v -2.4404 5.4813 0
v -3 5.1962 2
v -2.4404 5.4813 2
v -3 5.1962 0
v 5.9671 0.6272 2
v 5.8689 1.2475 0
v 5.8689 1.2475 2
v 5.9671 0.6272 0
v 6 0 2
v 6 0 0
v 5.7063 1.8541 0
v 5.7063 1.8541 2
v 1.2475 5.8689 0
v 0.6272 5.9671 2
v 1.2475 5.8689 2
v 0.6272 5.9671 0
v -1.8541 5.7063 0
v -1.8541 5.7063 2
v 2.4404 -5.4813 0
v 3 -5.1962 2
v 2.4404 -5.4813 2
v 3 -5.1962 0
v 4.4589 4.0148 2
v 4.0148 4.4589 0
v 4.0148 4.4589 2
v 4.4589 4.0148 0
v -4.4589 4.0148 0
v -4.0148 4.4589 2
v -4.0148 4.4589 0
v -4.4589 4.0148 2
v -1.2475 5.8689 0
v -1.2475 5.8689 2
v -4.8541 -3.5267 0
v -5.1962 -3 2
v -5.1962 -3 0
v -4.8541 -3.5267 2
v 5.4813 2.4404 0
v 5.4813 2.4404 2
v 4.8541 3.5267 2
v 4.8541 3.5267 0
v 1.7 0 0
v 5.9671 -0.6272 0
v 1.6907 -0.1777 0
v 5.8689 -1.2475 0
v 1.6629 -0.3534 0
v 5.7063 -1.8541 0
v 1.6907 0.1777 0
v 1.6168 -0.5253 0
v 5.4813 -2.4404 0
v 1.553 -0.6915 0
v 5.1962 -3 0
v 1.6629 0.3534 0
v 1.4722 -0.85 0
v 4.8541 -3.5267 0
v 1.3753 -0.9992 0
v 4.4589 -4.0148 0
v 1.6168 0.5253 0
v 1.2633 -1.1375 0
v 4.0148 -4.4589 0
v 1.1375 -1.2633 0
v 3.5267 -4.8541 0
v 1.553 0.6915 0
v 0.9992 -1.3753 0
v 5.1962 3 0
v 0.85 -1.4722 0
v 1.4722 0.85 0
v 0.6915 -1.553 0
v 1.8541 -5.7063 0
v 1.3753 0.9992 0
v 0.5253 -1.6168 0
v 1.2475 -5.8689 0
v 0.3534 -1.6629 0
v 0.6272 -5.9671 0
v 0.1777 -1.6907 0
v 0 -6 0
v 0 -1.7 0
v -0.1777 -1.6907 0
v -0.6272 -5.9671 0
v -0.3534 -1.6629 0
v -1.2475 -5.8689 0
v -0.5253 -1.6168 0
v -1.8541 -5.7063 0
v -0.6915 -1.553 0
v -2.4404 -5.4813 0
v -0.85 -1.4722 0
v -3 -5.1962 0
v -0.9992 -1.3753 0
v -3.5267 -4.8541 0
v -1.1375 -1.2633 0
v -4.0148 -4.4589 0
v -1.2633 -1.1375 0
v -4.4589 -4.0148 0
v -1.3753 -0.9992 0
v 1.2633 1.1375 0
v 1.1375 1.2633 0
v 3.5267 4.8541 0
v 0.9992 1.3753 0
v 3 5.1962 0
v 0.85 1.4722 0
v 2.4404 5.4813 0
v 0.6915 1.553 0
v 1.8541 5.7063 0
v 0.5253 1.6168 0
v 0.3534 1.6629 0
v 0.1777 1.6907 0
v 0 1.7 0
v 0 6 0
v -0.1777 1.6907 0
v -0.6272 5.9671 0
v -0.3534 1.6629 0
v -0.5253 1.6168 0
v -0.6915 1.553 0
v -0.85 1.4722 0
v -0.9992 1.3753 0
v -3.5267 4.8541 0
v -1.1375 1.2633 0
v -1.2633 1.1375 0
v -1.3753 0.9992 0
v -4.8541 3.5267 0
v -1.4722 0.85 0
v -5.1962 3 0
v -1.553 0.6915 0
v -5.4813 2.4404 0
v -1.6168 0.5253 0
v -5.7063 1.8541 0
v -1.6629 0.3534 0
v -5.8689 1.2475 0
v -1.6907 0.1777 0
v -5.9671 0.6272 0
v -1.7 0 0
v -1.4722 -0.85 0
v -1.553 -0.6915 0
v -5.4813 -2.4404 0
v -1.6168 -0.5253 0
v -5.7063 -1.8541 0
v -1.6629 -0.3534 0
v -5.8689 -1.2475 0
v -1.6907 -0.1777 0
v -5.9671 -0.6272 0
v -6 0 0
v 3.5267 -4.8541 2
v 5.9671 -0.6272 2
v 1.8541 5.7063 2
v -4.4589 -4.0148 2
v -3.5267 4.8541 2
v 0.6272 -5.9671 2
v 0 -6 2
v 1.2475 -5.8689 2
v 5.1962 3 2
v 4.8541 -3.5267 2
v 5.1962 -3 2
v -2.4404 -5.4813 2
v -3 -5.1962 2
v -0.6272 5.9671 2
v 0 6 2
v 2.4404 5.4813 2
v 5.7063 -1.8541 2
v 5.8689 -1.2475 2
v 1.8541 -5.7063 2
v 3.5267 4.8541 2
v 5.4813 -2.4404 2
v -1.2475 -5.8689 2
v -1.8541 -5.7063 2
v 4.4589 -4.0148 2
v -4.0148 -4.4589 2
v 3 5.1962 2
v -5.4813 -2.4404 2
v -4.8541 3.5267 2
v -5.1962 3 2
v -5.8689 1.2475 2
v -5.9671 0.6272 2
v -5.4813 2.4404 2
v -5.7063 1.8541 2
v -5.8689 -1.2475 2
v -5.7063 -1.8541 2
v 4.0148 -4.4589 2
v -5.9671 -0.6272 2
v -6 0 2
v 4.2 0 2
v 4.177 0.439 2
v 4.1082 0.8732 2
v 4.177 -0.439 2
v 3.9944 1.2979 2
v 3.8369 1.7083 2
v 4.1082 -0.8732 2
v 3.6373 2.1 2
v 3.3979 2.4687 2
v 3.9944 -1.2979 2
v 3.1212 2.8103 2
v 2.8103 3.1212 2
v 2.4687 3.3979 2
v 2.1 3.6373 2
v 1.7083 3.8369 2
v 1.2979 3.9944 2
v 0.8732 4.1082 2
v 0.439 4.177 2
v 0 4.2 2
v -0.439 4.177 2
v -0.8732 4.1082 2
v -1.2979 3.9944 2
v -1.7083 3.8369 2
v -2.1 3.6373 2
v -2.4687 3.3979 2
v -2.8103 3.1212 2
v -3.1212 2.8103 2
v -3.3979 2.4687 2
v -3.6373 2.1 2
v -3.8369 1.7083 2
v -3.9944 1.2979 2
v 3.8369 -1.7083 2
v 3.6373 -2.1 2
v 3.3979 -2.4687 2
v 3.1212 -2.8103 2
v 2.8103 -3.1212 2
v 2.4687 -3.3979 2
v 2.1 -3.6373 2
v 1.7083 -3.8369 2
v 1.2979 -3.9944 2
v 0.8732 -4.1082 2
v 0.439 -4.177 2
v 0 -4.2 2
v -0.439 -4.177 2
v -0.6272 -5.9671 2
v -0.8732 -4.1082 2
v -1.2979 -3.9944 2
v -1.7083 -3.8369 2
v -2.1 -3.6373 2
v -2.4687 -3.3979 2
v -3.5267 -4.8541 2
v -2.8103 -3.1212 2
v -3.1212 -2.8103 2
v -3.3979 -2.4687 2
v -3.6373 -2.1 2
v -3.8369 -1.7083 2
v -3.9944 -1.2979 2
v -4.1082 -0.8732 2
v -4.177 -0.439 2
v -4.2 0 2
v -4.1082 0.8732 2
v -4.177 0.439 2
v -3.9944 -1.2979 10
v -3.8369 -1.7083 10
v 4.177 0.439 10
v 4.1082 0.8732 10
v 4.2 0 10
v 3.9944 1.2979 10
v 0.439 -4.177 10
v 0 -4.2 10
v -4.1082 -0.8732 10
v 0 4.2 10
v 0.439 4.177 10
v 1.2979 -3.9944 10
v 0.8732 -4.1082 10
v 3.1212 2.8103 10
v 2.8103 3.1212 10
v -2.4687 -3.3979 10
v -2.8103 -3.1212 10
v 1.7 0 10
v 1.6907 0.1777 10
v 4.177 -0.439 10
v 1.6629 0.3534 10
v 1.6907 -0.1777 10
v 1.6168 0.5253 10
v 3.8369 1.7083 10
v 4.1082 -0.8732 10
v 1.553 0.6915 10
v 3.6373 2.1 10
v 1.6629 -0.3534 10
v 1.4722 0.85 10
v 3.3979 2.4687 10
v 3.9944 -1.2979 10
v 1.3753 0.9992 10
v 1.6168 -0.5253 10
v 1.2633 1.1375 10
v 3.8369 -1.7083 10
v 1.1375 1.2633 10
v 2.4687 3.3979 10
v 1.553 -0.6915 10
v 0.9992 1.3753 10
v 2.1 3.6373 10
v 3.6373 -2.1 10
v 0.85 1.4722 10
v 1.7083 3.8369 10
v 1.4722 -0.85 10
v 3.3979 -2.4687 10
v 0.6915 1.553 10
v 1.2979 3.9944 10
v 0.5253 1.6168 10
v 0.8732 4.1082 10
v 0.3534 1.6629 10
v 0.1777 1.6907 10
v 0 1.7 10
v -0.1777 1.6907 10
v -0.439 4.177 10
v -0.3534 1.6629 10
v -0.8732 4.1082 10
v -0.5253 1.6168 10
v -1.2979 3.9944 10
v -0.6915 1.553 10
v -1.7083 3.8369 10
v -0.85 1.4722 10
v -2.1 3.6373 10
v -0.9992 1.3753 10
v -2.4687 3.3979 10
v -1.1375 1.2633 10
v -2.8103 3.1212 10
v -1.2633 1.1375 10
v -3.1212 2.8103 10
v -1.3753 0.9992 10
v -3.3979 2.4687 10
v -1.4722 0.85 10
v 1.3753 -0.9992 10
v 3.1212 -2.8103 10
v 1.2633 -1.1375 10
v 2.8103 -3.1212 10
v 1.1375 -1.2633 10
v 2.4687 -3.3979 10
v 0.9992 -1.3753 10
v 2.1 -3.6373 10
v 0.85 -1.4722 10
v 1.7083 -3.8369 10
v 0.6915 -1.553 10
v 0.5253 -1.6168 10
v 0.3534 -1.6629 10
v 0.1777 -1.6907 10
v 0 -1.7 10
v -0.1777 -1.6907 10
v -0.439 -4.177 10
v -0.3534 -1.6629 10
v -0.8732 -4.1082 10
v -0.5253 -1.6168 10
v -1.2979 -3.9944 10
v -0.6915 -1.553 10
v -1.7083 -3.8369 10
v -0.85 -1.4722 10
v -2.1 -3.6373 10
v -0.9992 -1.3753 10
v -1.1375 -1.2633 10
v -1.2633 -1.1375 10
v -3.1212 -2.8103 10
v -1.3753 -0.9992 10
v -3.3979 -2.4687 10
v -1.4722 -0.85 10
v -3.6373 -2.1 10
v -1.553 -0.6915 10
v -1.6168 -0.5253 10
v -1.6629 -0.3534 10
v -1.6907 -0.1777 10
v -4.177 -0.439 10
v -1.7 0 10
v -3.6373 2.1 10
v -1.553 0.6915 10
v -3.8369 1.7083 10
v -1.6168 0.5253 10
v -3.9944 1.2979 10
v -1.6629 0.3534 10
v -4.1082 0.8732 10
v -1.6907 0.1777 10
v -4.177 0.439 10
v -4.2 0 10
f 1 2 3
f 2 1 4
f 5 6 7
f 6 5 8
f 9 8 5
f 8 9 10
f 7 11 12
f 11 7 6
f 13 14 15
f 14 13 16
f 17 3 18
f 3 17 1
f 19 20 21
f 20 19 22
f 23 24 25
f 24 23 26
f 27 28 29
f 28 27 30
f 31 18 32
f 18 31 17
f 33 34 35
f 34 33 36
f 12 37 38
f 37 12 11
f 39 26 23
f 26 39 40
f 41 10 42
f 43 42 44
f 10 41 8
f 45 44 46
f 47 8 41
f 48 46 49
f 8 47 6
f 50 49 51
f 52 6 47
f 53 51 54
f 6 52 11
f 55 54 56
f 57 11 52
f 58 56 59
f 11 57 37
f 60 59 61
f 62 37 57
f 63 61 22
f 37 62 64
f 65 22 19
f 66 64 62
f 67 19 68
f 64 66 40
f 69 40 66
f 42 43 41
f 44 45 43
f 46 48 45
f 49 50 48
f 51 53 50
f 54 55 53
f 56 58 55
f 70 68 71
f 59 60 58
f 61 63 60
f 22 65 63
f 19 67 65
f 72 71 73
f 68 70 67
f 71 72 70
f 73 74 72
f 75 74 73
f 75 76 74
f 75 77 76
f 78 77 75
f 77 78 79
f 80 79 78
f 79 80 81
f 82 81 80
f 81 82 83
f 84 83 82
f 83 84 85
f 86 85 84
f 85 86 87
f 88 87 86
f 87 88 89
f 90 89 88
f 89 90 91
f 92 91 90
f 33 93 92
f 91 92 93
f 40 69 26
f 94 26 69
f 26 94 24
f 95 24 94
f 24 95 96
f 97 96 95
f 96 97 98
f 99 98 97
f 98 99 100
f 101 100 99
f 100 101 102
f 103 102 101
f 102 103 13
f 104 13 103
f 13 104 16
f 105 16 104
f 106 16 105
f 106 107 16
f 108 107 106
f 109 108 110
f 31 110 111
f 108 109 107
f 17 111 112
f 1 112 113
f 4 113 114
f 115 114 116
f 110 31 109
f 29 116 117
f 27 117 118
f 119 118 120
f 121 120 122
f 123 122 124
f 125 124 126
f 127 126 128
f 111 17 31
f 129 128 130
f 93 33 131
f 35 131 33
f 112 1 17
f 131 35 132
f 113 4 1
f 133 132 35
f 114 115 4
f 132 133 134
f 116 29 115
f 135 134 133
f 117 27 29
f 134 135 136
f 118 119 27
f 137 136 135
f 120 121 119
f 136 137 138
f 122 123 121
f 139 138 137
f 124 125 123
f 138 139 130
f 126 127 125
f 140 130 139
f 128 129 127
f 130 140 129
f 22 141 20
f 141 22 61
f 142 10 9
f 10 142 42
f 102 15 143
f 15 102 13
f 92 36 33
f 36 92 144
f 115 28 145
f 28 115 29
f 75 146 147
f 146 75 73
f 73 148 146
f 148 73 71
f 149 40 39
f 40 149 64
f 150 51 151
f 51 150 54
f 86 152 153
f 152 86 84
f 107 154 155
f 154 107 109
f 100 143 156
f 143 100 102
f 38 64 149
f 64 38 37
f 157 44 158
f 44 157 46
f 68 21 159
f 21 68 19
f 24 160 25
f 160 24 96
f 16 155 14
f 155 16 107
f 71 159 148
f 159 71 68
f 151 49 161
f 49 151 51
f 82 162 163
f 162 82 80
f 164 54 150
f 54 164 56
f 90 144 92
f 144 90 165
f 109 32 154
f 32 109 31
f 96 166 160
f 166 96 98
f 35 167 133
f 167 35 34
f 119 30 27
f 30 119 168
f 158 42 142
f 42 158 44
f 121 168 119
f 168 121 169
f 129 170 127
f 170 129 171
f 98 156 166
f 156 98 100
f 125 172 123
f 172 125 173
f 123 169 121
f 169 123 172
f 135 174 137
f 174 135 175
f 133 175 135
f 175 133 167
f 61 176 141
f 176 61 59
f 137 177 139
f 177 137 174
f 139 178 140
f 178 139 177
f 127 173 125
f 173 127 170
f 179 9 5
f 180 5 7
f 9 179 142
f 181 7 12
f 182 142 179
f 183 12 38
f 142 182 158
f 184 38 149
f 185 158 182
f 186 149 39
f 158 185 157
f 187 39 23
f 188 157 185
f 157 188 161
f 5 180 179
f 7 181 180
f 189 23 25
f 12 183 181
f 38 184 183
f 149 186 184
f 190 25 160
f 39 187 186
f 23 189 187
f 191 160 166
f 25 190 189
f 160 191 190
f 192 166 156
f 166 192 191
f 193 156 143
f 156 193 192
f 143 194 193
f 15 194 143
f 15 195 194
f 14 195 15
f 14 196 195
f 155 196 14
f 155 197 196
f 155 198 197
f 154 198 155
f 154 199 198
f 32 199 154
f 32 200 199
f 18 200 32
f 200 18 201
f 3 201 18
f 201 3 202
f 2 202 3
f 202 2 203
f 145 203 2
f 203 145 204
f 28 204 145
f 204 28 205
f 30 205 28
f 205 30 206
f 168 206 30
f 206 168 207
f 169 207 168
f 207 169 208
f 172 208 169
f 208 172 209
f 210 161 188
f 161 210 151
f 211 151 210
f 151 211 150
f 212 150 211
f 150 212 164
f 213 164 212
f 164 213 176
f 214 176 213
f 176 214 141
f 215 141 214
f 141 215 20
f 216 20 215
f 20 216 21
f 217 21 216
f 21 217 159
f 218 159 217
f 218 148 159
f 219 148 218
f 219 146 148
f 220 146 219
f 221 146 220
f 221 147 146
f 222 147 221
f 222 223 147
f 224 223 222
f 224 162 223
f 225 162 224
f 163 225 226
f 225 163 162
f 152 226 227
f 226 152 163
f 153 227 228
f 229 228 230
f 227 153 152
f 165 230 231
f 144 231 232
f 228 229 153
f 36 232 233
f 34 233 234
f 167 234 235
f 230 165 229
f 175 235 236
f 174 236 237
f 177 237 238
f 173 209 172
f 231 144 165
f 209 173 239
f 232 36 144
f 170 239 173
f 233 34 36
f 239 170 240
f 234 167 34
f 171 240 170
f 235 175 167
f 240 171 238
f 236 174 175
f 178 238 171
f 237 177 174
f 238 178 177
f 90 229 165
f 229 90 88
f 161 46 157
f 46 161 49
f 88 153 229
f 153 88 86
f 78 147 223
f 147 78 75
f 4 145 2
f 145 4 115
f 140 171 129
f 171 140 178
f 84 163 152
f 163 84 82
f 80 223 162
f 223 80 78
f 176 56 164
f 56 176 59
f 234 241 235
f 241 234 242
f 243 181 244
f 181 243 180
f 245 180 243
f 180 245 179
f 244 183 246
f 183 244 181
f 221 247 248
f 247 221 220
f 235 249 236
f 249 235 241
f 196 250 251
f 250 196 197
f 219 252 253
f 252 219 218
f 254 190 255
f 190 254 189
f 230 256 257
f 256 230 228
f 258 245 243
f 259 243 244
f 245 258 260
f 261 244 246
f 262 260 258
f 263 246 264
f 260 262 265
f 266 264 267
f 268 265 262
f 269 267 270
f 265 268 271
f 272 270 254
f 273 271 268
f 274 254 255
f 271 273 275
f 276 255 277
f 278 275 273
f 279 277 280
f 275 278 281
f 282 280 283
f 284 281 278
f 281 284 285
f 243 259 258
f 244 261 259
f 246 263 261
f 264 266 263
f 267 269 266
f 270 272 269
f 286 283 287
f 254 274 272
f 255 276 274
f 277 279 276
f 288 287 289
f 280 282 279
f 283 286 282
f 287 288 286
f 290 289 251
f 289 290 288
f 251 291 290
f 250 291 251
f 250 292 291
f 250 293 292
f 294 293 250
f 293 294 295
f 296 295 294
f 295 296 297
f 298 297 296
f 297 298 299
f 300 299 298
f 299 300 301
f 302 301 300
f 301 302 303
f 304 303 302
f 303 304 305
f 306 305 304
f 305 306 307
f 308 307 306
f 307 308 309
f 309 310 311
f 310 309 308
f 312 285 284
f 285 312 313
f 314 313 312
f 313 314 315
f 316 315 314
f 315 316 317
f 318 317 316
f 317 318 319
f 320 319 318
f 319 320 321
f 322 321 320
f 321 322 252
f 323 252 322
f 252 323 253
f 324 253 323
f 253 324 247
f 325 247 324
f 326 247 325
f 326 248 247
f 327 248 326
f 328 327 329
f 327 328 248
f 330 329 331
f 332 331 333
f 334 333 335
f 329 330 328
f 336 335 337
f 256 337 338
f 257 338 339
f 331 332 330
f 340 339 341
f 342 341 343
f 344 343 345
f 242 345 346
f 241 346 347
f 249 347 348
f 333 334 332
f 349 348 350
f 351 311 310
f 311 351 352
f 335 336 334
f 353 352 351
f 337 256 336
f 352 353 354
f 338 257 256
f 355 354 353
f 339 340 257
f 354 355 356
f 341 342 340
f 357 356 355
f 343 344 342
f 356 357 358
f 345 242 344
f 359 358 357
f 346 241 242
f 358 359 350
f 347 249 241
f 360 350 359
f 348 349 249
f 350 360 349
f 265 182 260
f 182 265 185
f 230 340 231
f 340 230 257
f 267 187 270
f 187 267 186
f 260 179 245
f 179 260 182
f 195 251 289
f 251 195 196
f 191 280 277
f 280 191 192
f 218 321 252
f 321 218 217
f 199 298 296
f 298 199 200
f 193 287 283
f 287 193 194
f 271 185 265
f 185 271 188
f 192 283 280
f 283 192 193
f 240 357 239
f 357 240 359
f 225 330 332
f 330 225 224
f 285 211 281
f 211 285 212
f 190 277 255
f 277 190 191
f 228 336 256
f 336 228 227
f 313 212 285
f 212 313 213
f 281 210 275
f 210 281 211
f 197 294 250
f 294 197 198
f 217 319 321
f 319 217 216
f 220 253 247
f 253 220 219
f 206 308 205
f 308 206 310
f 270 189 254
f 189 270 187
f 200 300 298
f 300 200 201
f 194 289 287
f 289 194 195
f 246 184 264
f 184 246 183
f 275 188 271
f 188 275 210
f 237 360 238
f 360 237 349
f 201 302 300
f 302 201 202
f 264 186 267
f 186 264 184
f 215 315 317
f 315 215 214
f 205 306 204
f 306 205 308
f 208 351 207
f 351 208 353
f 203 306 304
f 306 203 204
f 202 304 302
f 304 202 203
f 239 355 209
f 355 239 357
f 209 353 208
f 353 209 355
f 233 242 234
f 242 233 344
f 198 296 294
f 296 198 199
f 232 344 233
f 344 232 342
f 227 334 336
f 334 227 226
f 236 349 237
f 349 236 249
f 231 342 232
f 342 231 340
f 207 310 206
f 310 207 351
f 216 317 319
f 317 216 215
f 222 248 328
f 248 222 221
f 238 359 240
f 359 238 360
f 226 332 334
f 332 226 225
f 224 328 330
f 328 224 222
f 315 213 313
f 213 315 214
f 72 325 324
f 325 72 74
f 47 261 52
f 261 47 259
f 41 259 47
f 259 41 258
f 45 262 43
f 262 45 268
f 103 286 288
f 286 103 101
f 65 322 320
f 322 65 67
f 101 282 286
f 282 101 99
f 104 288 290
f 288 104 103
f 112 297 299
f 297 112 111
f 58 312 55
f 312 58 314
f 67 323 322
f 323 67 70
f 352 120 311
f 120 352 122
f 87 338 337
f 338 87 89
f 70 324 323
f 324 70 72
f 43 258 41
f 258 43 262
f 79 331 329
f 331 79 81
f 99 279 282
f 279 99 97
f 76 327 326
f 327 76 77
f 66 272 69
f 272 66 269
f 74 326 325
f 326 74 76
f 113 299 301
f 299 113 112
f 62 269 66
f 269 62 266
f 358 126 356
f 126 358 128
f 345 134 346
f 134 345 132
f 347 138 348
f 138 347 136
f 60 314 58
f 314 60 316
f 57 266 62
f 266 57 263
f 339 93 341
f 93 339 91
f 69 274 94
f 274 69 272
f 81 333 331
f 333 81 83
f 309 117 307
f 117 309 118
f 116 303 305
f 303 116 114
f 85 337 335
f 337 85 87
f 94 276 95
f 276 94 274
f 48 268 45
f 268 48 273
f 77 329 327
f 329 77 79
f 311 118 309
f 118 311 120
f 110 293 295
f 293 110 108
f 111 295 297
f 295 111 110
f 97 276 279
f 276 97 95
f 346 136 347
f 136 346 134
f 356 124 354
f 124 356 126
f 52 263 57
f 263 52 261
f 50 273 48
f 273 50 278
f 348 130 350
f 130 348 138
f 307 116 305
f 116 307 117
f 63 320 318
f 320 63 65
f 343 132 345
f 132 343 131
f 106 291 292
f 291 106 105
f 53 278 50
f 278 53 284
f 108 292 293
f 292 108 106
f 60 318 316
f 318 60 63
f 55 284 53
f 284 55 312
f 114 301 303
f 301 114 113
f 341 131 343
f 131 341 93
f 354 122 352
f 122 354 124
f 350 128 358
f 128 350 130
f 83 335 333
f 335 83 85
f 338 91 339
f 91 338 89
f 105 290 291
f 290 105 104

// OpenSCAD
// Wall-mount standoff with screw flange.
$fn = 60;
eps = 0.02;
thread_d = 3.4;
base_d = 12;
length = 10;
difference() { union() { cylinder(d=base_d,h=2); cylinder(d=thread_d+5,h=length); } translate([0,0,-eps]) cylinder(d=thread_d,h=length+2*eps); }
